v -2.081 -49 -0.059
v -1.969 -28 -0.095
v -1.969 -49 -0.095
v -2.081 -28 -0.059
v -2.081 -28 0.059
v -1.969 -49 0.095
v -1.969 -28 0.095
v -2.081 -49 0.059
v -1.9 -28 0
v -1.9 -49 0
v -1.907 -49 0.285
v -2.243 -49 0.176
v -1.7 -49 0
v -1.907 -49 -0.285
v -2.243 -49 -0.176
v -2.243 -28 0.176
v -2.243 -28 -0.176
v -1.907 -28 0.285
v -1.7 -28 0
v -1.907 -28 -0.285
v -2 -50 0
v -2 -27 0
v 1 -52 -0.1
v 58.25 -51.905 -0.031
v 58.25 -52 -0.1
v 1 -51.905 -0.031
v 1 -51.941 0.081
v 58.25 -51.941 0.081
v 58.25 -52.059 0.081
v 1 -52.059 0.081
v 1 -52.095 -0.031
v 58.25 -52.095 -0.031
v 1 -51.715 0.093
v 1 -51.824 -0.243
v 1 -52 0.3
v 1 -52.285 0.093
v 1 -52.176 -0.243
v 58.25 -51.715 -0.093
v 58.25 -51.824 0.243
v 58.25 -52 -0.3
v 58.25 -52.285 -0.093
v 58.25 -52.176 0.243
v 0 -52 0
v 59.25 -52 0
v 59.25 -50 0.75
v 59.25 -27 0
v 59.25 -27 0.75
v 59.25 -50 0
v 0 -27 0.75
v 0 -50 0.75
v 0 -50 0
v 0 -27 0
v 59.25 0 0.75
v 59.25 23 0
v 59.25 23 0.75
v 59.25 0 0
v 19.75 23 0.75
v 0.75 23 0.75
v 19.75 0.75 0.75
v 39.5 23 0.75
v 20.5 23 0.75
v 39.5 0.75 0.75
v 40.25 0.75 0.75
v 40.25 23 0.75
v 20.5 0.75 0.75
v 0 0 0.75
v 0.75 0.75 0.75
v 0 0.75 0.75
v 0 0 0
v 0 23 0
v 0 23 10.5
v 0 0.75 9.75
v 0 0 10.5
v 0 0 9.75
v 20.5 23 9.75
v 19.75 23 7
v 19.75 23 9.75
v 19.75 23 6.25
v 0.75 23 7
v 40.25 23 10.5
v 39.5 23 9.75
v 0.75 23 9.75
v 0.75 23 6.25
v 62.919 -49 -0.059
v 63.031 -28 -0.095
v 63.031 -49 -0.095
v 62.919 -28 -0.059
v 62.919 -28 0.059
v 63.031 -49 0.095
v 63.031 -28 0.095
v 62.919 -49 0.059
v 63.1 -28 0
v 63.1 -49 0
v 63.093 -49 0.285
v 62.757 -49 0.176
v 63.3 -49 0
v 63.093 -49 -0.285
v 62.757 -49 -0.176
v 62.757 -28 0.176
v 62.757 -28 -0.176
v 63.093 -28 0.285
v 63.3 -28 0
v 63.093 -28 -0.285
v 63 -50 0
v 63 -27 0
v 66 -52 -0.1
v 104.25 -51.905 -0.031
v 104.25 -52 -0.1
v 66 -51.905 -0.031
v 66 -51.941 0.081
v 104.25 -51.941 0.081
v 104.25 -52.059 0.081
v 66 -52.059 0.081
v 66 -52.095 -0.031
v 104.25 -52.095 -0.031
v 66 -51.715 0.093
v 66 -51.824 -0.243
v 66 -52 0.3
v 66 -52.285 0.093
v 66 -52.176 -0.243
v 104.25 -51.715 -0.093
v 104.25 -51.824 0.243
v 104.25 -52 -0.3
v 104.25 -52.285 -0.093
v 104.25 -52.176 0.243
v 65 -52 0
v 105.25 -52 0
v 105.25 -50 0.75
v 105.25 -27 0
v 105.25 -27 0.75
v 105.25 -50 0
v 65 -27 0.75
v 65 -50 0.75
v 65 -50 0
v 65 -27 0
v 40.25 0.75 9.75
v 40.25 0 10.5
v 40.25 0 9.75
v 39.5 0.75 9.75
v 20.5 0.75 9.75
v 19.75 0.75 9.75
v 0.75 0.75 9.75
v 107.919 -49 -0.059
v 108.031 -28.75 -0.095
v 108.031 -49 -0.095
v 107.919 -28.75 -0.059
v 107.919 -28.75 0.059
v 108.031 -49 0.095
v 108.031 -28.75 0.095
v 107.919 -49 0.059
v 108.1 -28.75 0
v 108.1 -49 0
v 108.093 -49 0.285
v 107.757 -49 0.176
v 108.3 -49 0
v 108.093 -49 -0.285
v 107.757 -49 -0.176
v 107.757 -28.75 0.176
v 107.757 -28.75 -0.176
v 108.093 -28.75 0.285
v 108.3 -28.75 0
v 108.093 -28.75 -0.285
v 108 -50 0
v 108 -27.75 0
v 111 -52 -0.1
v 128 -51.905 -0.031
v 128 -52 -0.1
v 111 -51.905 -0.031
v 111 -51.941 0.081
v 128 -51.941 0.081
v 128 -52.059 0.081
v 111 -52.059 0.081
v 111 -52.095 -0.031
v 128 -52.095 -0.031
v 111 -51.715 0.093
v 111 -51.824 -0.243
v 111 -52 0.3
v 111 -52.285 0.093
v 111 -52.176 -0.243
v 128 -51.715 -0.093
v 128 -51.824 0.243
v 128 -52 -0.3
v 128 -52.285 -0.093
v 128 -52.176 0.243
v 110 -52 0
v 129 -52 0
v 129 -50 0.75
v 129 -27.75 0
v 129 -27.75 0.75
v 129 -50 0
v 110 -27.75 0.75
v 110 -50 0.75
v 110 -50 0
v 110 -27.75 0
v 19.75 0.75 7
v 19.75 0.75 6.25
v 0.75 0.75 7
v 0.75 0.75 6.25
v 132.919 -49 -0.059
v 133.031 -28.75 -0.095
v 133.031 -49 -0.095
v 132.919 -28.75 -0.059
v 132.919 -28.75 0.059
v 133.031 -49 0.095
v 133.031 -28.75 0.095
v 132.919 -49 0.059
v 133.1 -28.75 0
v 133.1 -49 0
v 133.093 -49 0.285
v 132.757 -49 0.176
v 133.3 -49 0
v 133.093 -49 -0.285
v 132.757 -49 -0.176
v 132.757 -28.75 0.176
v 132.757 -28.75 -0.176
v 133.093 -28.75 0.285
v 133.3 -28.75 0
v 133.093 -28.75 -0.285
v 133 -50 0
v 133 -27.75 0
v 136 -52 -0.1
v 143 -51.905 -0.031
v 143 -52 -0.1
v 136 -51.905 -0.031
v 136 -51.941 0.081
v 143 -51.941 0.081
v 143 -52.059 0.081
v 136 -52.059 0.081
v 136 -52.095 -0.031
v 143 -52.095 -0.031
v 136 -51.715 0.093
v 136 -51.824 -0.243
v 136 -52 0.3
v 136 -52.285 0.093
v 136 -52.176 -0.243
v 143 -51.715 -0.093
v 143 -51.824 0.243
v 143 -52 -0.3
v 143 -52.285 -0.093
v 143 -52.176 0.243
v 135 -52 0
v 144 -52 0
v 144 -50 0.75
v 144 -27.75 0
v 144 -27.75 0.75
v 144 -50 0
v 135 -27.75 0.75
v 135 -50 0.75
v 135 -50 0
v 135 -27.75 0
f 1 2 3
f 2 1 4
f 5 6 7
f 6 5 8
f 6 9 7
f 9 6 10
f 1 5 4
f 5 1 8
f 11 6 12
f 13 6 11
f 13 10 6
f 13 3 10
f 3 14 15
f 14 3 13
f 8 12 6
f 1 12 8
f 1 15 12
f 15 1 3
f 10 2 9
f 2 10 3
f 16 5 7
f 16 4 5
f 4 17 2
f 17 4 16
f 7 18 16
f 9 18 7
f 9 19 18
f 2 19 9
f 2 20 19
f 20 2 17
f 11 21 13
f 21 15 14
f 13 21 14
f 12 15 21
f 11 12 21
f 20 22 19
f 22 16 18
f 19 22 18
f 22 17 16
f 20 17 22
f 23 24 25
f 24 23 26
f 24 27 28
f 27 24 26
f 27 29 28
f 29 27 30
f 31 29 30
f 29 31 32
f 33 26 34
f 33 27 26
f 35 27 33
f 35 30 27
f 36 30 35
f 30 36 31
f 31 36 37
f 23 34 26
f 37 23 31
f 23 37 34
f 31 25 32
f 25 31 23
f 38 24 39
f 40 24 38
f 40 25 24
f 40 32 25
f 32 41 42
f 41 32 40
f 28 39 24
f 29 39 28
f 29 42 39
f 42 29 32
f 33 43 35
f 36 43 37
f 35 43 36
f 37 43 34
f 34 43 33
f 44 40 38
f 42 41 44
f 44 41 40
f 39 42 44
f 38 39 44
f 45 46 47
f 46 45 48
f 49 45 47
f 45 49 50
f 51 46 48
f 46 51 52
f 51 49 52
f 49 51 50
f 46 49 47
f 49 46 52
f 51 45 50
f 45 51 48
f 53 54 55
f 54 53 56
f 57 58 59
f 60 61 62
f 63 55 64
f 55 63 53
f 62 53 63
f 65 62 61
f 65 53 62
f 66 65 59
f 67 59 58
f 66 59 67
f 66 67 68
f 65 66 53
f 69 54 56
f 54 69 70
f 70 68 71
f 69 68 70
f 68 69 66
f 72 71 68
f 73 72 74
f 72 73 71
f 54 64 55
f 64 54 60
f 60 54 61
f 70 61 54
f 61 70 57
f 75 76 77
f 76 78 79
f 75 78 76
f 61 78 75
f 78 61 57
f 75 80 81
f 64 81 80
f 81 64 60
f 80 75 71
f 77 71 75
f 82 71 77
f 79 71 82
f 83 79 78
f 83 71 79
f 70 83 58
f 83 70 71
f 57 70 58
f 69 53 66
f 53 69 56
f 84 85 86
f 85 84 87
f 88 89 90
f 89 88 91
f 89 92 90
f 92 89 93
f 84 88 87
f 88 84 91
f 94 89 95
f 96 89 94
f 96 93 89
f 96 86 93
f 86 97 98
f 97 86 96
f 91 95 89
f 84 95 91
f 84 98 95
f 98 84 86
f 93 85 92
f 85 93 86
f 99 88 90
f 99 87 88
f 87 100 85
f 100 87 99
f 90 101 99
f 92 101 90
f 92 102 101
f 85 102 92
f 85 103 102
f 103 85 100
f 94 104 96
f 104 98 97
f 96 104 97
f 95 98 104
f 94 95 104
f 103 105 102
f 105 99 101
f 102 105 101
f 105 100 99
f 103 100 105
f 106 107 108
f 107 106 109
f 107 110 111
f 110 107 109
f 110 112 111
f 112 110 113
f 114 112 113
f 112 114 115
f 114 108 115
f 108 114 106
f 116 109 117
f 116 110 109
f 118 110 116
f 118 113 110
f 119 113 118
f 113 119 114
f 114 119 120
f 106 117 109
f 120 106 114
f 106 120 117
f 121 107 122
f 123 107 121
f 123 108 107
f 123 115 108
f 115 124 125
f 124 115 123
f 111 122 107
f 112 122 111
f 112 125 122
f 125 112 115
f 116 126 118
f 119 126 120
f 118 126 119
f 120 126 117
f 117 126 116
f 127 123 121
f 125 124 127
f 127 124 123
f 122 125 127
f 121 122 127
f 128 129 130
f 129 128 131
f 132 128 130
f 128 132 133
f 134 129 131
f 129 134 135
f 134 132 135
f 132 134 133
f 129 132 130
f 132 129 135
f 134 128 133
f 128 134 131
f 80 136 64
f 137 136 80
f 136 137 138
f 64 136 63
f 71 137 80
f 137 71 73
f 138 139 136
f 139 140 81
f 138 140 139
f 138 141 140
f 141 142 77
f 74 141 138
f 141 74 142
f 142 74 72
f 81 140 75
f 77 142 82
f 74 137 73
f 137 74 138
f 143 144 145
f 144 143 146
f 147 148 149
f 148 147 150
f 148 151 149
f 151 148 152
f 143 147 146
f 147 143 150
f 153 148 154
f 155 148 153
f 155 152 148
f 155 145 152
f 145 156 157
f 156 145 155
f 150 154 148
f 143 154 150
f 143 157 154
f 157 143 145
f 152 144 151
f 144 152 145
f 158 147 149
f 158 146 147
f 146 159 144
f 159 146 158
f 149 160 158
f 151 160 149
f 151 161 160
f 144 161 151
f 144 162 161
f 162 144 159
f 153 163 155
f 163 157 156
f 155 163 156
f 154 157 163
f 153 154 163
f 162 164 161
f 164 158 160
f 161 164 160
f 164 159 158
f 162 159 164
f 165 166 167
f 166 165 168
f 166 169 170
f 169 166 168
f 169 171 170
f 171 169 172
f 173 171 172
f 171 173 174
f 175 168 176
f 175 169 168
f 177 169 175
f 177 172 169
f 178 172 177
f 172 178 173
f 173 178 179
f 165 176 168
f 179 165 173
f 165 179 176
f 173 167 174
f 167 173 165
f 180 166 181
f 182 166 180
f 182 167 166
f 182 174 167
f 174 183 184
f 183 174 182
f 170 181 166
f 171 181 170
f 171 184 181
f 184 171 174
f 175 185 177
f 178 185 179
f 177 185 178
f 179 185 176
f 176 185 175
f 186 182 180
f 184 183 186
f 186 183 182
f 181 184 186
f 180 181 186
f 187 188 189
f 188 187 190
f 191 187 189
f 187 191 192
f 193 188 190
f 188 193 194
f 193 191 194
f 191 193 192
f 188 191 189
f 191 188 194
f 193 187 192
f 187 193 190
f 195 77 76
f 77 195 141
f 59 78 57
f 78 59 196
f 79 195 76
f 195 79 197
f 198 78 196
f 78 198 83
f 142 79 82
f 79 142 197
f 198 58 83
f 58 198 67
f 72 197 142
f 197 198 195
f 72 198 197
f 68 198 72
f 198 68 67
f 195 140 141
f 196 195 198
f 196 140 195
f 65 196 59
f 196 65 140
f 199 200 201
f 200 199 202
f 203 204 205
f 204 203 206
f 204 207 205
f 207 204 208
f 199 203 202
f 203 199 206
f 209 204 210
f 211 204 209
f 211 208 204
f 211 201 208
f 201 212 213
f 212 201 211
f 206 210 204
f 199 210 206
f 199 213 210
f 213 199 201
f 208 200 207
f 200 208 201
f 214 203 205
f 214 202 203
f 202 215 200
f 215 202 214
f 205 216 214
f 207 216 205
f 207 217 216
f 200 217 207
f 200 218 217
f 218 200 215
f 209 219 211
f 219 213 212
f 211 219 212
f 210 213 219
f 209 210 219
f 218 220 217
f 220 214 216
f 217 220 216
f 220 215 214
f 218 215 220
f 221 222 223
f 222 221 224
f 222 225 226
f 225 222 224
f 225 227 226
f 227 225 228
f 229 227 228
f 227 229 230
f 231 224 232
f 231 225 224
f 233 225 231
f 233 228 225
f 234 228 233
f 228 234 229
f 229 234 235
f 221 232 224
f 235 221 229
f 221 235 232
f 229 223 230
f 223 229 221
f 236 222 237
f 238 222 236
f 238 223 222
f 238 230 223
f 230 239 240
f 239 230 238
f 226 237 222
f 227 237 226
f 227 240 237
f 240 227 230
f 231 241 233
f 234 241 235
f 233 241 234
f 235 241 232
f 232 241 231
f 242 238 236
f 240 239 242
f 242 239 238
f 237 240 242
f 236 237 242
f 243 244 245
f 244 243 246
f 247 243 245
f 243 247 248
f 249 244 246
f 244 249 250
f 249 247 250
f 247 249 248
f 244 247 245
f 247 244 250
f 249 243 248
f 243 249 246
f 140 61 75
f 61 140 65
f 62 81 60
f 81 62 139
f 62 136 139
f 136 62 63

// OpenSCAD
/*
W: 149.5 cm = 58.85"
D: 60 cm = 23.622"
H: 70 cm = 27.56"
*/

Width = 59.25; // + 0.75 * 2
Depth = 23;
Thick = 0.75;

//--------------------------------------------------------------------------------------------------
// Common moudles
//--------------------------------------------------------------------------------------------------

// X dimensional arrow
module arrow_x(l)
{
    line_w = 0.1;
    arrow_w = 1;
    arrow_h = 0.3;

    // Line
    translate([l / 2, 0, 0])
    {
        rotate([0, 90, 0])
        {
            color([0.4, 0.4, 0.4])
            cylinder(l - arrow_w * 2, line_w, line_w, true);
        }
    }

    // Left arrow
    translate([arrow_w, 0, 0])
    {
        rotate([0, 270, 0])
        {
            color([0.4, 0.4, 0.4])
            cylinder(arrow_w, arrow_h, 0, false);
        }
    }

    // Right arrow
    translate([l - arrow_w, 0, 0])
    {
        rotate([0, 90, 0])
        {
            color([0.4, 0.4, 0.4])
            cylinder(arrow_w, arrow_h, 0, false);
        }
    }

    // Text
    translate([l/3, 0.5, 0])
    {
        color([0.4, 0.4, 0.4])
        text(str(l), size=1);
    }
}

// Y dimensional arrow
module arrow_y(l)
{
    line_w = 0.1;
    arrow_w = 1;
    arrow_h = 0.3;

    // Line
    translate([0, l / 2, 0])
    {
        rotate([90, 0, 00])
        {
            color([0.4, 0.4, 0.4])
            cylinder(l - arrow_w * 2, line_w, line_w, true);
        }
    }

    // Left arrow
    translate([0 ,arrow_w, 0])
    {
        rotate([90, 0, 0])
        {
            color([0.4, 0.4, 0.4])
            cylinder(arrow_w, arrow_h, 0, false);
        }
    }

    // Right arrow
    translate([0, l - arrow_w, 0])
    {
        rotate([270, 0, 0])
        {
            color([0.4, 0.4, 0.4])
            cylinder(arrow_w, arrow_h, 0, false);
        }
    }

    // Text
    translate([-0.5, l/3, 0])
    {
        rotate([0 ,0, 90])
        {
            color([0.4, 0.4, 0.4])
            text(str(l), size=1);
        }
    }
}

module dimension(x, y, z, r, g, b, dx, dy = 50)
{
    
    translate([dx, -dy, 0])
    {
        color([r, g, b])
        cube([x, y, z]);

        translate([-2, 0, 0])
        {
            arrow_y(y);
        }

        translate([0, -2, 0])
        {
            arrow_x(x);
        }
    }
}

DimensionY = 50;

module board(x, y, z, r, g, b, posX, posY, posZ, rotX, rotY, rotZ, dimX, dimY = DimensionY)
{
    translate([posX, posY, posZ])
    {
        rotate([rotX, rotY, rotZ])
        {
            color([r, g, b])
            cube([x, y, z]);
        }
    }

    dimension(x, y, z, r, g, b, dimX, dimY);
}

//------------------------------------------------------------------------------
// Draw parts
//------------------------------------------------------------------------------
// Horizontal 01
board(
    Width, Depth, Thick,
    0.7, 0.3, 0.3,
    0, 0, 0,
    0, 0, 0,
    0, DimensionY);

// Horizontal 02
board(
    40.25, Depth, Thick,
    0.7, 0.7, 0.1,
    0, 0, 9 + Thick,
    0, 0, 0,
    65, DimensionY);

// Horizontal 03
board(
    19, Depth - 0.75, Thick,
    0.2, 0.6, 0.1,
    Thick, 0.75, 5.5 + Thick,
    0, 0, 0,
    110, DimensionY);

// Vertical 01
board(9, Depth - 0.75, Thick,
    0.9, 0.8, 0.9,
    Thick, 0.75, Thick,
    0, 270, 0,
    135, DimensionY);

// Vertical 02
board(9, Depth - 0.75, Thick,
    0.9, 0.8, 0.9,
    Thick + 19 + Thick, 0.75, Thick,
    0, 270, 0,
    135, DimensionY);

// Vertical 03
board(9, Depth - 0.75, Thick,
    0.9, 0.8, 0.9,
    Thick + 19 + Thick + 19 + Thick, 0.75, Thick,
    0, 270, 0,
    135, DimensionY);


/*
59.25 + 40.25 + 19 + 9 = 127.5
255
96 * 3

*/
